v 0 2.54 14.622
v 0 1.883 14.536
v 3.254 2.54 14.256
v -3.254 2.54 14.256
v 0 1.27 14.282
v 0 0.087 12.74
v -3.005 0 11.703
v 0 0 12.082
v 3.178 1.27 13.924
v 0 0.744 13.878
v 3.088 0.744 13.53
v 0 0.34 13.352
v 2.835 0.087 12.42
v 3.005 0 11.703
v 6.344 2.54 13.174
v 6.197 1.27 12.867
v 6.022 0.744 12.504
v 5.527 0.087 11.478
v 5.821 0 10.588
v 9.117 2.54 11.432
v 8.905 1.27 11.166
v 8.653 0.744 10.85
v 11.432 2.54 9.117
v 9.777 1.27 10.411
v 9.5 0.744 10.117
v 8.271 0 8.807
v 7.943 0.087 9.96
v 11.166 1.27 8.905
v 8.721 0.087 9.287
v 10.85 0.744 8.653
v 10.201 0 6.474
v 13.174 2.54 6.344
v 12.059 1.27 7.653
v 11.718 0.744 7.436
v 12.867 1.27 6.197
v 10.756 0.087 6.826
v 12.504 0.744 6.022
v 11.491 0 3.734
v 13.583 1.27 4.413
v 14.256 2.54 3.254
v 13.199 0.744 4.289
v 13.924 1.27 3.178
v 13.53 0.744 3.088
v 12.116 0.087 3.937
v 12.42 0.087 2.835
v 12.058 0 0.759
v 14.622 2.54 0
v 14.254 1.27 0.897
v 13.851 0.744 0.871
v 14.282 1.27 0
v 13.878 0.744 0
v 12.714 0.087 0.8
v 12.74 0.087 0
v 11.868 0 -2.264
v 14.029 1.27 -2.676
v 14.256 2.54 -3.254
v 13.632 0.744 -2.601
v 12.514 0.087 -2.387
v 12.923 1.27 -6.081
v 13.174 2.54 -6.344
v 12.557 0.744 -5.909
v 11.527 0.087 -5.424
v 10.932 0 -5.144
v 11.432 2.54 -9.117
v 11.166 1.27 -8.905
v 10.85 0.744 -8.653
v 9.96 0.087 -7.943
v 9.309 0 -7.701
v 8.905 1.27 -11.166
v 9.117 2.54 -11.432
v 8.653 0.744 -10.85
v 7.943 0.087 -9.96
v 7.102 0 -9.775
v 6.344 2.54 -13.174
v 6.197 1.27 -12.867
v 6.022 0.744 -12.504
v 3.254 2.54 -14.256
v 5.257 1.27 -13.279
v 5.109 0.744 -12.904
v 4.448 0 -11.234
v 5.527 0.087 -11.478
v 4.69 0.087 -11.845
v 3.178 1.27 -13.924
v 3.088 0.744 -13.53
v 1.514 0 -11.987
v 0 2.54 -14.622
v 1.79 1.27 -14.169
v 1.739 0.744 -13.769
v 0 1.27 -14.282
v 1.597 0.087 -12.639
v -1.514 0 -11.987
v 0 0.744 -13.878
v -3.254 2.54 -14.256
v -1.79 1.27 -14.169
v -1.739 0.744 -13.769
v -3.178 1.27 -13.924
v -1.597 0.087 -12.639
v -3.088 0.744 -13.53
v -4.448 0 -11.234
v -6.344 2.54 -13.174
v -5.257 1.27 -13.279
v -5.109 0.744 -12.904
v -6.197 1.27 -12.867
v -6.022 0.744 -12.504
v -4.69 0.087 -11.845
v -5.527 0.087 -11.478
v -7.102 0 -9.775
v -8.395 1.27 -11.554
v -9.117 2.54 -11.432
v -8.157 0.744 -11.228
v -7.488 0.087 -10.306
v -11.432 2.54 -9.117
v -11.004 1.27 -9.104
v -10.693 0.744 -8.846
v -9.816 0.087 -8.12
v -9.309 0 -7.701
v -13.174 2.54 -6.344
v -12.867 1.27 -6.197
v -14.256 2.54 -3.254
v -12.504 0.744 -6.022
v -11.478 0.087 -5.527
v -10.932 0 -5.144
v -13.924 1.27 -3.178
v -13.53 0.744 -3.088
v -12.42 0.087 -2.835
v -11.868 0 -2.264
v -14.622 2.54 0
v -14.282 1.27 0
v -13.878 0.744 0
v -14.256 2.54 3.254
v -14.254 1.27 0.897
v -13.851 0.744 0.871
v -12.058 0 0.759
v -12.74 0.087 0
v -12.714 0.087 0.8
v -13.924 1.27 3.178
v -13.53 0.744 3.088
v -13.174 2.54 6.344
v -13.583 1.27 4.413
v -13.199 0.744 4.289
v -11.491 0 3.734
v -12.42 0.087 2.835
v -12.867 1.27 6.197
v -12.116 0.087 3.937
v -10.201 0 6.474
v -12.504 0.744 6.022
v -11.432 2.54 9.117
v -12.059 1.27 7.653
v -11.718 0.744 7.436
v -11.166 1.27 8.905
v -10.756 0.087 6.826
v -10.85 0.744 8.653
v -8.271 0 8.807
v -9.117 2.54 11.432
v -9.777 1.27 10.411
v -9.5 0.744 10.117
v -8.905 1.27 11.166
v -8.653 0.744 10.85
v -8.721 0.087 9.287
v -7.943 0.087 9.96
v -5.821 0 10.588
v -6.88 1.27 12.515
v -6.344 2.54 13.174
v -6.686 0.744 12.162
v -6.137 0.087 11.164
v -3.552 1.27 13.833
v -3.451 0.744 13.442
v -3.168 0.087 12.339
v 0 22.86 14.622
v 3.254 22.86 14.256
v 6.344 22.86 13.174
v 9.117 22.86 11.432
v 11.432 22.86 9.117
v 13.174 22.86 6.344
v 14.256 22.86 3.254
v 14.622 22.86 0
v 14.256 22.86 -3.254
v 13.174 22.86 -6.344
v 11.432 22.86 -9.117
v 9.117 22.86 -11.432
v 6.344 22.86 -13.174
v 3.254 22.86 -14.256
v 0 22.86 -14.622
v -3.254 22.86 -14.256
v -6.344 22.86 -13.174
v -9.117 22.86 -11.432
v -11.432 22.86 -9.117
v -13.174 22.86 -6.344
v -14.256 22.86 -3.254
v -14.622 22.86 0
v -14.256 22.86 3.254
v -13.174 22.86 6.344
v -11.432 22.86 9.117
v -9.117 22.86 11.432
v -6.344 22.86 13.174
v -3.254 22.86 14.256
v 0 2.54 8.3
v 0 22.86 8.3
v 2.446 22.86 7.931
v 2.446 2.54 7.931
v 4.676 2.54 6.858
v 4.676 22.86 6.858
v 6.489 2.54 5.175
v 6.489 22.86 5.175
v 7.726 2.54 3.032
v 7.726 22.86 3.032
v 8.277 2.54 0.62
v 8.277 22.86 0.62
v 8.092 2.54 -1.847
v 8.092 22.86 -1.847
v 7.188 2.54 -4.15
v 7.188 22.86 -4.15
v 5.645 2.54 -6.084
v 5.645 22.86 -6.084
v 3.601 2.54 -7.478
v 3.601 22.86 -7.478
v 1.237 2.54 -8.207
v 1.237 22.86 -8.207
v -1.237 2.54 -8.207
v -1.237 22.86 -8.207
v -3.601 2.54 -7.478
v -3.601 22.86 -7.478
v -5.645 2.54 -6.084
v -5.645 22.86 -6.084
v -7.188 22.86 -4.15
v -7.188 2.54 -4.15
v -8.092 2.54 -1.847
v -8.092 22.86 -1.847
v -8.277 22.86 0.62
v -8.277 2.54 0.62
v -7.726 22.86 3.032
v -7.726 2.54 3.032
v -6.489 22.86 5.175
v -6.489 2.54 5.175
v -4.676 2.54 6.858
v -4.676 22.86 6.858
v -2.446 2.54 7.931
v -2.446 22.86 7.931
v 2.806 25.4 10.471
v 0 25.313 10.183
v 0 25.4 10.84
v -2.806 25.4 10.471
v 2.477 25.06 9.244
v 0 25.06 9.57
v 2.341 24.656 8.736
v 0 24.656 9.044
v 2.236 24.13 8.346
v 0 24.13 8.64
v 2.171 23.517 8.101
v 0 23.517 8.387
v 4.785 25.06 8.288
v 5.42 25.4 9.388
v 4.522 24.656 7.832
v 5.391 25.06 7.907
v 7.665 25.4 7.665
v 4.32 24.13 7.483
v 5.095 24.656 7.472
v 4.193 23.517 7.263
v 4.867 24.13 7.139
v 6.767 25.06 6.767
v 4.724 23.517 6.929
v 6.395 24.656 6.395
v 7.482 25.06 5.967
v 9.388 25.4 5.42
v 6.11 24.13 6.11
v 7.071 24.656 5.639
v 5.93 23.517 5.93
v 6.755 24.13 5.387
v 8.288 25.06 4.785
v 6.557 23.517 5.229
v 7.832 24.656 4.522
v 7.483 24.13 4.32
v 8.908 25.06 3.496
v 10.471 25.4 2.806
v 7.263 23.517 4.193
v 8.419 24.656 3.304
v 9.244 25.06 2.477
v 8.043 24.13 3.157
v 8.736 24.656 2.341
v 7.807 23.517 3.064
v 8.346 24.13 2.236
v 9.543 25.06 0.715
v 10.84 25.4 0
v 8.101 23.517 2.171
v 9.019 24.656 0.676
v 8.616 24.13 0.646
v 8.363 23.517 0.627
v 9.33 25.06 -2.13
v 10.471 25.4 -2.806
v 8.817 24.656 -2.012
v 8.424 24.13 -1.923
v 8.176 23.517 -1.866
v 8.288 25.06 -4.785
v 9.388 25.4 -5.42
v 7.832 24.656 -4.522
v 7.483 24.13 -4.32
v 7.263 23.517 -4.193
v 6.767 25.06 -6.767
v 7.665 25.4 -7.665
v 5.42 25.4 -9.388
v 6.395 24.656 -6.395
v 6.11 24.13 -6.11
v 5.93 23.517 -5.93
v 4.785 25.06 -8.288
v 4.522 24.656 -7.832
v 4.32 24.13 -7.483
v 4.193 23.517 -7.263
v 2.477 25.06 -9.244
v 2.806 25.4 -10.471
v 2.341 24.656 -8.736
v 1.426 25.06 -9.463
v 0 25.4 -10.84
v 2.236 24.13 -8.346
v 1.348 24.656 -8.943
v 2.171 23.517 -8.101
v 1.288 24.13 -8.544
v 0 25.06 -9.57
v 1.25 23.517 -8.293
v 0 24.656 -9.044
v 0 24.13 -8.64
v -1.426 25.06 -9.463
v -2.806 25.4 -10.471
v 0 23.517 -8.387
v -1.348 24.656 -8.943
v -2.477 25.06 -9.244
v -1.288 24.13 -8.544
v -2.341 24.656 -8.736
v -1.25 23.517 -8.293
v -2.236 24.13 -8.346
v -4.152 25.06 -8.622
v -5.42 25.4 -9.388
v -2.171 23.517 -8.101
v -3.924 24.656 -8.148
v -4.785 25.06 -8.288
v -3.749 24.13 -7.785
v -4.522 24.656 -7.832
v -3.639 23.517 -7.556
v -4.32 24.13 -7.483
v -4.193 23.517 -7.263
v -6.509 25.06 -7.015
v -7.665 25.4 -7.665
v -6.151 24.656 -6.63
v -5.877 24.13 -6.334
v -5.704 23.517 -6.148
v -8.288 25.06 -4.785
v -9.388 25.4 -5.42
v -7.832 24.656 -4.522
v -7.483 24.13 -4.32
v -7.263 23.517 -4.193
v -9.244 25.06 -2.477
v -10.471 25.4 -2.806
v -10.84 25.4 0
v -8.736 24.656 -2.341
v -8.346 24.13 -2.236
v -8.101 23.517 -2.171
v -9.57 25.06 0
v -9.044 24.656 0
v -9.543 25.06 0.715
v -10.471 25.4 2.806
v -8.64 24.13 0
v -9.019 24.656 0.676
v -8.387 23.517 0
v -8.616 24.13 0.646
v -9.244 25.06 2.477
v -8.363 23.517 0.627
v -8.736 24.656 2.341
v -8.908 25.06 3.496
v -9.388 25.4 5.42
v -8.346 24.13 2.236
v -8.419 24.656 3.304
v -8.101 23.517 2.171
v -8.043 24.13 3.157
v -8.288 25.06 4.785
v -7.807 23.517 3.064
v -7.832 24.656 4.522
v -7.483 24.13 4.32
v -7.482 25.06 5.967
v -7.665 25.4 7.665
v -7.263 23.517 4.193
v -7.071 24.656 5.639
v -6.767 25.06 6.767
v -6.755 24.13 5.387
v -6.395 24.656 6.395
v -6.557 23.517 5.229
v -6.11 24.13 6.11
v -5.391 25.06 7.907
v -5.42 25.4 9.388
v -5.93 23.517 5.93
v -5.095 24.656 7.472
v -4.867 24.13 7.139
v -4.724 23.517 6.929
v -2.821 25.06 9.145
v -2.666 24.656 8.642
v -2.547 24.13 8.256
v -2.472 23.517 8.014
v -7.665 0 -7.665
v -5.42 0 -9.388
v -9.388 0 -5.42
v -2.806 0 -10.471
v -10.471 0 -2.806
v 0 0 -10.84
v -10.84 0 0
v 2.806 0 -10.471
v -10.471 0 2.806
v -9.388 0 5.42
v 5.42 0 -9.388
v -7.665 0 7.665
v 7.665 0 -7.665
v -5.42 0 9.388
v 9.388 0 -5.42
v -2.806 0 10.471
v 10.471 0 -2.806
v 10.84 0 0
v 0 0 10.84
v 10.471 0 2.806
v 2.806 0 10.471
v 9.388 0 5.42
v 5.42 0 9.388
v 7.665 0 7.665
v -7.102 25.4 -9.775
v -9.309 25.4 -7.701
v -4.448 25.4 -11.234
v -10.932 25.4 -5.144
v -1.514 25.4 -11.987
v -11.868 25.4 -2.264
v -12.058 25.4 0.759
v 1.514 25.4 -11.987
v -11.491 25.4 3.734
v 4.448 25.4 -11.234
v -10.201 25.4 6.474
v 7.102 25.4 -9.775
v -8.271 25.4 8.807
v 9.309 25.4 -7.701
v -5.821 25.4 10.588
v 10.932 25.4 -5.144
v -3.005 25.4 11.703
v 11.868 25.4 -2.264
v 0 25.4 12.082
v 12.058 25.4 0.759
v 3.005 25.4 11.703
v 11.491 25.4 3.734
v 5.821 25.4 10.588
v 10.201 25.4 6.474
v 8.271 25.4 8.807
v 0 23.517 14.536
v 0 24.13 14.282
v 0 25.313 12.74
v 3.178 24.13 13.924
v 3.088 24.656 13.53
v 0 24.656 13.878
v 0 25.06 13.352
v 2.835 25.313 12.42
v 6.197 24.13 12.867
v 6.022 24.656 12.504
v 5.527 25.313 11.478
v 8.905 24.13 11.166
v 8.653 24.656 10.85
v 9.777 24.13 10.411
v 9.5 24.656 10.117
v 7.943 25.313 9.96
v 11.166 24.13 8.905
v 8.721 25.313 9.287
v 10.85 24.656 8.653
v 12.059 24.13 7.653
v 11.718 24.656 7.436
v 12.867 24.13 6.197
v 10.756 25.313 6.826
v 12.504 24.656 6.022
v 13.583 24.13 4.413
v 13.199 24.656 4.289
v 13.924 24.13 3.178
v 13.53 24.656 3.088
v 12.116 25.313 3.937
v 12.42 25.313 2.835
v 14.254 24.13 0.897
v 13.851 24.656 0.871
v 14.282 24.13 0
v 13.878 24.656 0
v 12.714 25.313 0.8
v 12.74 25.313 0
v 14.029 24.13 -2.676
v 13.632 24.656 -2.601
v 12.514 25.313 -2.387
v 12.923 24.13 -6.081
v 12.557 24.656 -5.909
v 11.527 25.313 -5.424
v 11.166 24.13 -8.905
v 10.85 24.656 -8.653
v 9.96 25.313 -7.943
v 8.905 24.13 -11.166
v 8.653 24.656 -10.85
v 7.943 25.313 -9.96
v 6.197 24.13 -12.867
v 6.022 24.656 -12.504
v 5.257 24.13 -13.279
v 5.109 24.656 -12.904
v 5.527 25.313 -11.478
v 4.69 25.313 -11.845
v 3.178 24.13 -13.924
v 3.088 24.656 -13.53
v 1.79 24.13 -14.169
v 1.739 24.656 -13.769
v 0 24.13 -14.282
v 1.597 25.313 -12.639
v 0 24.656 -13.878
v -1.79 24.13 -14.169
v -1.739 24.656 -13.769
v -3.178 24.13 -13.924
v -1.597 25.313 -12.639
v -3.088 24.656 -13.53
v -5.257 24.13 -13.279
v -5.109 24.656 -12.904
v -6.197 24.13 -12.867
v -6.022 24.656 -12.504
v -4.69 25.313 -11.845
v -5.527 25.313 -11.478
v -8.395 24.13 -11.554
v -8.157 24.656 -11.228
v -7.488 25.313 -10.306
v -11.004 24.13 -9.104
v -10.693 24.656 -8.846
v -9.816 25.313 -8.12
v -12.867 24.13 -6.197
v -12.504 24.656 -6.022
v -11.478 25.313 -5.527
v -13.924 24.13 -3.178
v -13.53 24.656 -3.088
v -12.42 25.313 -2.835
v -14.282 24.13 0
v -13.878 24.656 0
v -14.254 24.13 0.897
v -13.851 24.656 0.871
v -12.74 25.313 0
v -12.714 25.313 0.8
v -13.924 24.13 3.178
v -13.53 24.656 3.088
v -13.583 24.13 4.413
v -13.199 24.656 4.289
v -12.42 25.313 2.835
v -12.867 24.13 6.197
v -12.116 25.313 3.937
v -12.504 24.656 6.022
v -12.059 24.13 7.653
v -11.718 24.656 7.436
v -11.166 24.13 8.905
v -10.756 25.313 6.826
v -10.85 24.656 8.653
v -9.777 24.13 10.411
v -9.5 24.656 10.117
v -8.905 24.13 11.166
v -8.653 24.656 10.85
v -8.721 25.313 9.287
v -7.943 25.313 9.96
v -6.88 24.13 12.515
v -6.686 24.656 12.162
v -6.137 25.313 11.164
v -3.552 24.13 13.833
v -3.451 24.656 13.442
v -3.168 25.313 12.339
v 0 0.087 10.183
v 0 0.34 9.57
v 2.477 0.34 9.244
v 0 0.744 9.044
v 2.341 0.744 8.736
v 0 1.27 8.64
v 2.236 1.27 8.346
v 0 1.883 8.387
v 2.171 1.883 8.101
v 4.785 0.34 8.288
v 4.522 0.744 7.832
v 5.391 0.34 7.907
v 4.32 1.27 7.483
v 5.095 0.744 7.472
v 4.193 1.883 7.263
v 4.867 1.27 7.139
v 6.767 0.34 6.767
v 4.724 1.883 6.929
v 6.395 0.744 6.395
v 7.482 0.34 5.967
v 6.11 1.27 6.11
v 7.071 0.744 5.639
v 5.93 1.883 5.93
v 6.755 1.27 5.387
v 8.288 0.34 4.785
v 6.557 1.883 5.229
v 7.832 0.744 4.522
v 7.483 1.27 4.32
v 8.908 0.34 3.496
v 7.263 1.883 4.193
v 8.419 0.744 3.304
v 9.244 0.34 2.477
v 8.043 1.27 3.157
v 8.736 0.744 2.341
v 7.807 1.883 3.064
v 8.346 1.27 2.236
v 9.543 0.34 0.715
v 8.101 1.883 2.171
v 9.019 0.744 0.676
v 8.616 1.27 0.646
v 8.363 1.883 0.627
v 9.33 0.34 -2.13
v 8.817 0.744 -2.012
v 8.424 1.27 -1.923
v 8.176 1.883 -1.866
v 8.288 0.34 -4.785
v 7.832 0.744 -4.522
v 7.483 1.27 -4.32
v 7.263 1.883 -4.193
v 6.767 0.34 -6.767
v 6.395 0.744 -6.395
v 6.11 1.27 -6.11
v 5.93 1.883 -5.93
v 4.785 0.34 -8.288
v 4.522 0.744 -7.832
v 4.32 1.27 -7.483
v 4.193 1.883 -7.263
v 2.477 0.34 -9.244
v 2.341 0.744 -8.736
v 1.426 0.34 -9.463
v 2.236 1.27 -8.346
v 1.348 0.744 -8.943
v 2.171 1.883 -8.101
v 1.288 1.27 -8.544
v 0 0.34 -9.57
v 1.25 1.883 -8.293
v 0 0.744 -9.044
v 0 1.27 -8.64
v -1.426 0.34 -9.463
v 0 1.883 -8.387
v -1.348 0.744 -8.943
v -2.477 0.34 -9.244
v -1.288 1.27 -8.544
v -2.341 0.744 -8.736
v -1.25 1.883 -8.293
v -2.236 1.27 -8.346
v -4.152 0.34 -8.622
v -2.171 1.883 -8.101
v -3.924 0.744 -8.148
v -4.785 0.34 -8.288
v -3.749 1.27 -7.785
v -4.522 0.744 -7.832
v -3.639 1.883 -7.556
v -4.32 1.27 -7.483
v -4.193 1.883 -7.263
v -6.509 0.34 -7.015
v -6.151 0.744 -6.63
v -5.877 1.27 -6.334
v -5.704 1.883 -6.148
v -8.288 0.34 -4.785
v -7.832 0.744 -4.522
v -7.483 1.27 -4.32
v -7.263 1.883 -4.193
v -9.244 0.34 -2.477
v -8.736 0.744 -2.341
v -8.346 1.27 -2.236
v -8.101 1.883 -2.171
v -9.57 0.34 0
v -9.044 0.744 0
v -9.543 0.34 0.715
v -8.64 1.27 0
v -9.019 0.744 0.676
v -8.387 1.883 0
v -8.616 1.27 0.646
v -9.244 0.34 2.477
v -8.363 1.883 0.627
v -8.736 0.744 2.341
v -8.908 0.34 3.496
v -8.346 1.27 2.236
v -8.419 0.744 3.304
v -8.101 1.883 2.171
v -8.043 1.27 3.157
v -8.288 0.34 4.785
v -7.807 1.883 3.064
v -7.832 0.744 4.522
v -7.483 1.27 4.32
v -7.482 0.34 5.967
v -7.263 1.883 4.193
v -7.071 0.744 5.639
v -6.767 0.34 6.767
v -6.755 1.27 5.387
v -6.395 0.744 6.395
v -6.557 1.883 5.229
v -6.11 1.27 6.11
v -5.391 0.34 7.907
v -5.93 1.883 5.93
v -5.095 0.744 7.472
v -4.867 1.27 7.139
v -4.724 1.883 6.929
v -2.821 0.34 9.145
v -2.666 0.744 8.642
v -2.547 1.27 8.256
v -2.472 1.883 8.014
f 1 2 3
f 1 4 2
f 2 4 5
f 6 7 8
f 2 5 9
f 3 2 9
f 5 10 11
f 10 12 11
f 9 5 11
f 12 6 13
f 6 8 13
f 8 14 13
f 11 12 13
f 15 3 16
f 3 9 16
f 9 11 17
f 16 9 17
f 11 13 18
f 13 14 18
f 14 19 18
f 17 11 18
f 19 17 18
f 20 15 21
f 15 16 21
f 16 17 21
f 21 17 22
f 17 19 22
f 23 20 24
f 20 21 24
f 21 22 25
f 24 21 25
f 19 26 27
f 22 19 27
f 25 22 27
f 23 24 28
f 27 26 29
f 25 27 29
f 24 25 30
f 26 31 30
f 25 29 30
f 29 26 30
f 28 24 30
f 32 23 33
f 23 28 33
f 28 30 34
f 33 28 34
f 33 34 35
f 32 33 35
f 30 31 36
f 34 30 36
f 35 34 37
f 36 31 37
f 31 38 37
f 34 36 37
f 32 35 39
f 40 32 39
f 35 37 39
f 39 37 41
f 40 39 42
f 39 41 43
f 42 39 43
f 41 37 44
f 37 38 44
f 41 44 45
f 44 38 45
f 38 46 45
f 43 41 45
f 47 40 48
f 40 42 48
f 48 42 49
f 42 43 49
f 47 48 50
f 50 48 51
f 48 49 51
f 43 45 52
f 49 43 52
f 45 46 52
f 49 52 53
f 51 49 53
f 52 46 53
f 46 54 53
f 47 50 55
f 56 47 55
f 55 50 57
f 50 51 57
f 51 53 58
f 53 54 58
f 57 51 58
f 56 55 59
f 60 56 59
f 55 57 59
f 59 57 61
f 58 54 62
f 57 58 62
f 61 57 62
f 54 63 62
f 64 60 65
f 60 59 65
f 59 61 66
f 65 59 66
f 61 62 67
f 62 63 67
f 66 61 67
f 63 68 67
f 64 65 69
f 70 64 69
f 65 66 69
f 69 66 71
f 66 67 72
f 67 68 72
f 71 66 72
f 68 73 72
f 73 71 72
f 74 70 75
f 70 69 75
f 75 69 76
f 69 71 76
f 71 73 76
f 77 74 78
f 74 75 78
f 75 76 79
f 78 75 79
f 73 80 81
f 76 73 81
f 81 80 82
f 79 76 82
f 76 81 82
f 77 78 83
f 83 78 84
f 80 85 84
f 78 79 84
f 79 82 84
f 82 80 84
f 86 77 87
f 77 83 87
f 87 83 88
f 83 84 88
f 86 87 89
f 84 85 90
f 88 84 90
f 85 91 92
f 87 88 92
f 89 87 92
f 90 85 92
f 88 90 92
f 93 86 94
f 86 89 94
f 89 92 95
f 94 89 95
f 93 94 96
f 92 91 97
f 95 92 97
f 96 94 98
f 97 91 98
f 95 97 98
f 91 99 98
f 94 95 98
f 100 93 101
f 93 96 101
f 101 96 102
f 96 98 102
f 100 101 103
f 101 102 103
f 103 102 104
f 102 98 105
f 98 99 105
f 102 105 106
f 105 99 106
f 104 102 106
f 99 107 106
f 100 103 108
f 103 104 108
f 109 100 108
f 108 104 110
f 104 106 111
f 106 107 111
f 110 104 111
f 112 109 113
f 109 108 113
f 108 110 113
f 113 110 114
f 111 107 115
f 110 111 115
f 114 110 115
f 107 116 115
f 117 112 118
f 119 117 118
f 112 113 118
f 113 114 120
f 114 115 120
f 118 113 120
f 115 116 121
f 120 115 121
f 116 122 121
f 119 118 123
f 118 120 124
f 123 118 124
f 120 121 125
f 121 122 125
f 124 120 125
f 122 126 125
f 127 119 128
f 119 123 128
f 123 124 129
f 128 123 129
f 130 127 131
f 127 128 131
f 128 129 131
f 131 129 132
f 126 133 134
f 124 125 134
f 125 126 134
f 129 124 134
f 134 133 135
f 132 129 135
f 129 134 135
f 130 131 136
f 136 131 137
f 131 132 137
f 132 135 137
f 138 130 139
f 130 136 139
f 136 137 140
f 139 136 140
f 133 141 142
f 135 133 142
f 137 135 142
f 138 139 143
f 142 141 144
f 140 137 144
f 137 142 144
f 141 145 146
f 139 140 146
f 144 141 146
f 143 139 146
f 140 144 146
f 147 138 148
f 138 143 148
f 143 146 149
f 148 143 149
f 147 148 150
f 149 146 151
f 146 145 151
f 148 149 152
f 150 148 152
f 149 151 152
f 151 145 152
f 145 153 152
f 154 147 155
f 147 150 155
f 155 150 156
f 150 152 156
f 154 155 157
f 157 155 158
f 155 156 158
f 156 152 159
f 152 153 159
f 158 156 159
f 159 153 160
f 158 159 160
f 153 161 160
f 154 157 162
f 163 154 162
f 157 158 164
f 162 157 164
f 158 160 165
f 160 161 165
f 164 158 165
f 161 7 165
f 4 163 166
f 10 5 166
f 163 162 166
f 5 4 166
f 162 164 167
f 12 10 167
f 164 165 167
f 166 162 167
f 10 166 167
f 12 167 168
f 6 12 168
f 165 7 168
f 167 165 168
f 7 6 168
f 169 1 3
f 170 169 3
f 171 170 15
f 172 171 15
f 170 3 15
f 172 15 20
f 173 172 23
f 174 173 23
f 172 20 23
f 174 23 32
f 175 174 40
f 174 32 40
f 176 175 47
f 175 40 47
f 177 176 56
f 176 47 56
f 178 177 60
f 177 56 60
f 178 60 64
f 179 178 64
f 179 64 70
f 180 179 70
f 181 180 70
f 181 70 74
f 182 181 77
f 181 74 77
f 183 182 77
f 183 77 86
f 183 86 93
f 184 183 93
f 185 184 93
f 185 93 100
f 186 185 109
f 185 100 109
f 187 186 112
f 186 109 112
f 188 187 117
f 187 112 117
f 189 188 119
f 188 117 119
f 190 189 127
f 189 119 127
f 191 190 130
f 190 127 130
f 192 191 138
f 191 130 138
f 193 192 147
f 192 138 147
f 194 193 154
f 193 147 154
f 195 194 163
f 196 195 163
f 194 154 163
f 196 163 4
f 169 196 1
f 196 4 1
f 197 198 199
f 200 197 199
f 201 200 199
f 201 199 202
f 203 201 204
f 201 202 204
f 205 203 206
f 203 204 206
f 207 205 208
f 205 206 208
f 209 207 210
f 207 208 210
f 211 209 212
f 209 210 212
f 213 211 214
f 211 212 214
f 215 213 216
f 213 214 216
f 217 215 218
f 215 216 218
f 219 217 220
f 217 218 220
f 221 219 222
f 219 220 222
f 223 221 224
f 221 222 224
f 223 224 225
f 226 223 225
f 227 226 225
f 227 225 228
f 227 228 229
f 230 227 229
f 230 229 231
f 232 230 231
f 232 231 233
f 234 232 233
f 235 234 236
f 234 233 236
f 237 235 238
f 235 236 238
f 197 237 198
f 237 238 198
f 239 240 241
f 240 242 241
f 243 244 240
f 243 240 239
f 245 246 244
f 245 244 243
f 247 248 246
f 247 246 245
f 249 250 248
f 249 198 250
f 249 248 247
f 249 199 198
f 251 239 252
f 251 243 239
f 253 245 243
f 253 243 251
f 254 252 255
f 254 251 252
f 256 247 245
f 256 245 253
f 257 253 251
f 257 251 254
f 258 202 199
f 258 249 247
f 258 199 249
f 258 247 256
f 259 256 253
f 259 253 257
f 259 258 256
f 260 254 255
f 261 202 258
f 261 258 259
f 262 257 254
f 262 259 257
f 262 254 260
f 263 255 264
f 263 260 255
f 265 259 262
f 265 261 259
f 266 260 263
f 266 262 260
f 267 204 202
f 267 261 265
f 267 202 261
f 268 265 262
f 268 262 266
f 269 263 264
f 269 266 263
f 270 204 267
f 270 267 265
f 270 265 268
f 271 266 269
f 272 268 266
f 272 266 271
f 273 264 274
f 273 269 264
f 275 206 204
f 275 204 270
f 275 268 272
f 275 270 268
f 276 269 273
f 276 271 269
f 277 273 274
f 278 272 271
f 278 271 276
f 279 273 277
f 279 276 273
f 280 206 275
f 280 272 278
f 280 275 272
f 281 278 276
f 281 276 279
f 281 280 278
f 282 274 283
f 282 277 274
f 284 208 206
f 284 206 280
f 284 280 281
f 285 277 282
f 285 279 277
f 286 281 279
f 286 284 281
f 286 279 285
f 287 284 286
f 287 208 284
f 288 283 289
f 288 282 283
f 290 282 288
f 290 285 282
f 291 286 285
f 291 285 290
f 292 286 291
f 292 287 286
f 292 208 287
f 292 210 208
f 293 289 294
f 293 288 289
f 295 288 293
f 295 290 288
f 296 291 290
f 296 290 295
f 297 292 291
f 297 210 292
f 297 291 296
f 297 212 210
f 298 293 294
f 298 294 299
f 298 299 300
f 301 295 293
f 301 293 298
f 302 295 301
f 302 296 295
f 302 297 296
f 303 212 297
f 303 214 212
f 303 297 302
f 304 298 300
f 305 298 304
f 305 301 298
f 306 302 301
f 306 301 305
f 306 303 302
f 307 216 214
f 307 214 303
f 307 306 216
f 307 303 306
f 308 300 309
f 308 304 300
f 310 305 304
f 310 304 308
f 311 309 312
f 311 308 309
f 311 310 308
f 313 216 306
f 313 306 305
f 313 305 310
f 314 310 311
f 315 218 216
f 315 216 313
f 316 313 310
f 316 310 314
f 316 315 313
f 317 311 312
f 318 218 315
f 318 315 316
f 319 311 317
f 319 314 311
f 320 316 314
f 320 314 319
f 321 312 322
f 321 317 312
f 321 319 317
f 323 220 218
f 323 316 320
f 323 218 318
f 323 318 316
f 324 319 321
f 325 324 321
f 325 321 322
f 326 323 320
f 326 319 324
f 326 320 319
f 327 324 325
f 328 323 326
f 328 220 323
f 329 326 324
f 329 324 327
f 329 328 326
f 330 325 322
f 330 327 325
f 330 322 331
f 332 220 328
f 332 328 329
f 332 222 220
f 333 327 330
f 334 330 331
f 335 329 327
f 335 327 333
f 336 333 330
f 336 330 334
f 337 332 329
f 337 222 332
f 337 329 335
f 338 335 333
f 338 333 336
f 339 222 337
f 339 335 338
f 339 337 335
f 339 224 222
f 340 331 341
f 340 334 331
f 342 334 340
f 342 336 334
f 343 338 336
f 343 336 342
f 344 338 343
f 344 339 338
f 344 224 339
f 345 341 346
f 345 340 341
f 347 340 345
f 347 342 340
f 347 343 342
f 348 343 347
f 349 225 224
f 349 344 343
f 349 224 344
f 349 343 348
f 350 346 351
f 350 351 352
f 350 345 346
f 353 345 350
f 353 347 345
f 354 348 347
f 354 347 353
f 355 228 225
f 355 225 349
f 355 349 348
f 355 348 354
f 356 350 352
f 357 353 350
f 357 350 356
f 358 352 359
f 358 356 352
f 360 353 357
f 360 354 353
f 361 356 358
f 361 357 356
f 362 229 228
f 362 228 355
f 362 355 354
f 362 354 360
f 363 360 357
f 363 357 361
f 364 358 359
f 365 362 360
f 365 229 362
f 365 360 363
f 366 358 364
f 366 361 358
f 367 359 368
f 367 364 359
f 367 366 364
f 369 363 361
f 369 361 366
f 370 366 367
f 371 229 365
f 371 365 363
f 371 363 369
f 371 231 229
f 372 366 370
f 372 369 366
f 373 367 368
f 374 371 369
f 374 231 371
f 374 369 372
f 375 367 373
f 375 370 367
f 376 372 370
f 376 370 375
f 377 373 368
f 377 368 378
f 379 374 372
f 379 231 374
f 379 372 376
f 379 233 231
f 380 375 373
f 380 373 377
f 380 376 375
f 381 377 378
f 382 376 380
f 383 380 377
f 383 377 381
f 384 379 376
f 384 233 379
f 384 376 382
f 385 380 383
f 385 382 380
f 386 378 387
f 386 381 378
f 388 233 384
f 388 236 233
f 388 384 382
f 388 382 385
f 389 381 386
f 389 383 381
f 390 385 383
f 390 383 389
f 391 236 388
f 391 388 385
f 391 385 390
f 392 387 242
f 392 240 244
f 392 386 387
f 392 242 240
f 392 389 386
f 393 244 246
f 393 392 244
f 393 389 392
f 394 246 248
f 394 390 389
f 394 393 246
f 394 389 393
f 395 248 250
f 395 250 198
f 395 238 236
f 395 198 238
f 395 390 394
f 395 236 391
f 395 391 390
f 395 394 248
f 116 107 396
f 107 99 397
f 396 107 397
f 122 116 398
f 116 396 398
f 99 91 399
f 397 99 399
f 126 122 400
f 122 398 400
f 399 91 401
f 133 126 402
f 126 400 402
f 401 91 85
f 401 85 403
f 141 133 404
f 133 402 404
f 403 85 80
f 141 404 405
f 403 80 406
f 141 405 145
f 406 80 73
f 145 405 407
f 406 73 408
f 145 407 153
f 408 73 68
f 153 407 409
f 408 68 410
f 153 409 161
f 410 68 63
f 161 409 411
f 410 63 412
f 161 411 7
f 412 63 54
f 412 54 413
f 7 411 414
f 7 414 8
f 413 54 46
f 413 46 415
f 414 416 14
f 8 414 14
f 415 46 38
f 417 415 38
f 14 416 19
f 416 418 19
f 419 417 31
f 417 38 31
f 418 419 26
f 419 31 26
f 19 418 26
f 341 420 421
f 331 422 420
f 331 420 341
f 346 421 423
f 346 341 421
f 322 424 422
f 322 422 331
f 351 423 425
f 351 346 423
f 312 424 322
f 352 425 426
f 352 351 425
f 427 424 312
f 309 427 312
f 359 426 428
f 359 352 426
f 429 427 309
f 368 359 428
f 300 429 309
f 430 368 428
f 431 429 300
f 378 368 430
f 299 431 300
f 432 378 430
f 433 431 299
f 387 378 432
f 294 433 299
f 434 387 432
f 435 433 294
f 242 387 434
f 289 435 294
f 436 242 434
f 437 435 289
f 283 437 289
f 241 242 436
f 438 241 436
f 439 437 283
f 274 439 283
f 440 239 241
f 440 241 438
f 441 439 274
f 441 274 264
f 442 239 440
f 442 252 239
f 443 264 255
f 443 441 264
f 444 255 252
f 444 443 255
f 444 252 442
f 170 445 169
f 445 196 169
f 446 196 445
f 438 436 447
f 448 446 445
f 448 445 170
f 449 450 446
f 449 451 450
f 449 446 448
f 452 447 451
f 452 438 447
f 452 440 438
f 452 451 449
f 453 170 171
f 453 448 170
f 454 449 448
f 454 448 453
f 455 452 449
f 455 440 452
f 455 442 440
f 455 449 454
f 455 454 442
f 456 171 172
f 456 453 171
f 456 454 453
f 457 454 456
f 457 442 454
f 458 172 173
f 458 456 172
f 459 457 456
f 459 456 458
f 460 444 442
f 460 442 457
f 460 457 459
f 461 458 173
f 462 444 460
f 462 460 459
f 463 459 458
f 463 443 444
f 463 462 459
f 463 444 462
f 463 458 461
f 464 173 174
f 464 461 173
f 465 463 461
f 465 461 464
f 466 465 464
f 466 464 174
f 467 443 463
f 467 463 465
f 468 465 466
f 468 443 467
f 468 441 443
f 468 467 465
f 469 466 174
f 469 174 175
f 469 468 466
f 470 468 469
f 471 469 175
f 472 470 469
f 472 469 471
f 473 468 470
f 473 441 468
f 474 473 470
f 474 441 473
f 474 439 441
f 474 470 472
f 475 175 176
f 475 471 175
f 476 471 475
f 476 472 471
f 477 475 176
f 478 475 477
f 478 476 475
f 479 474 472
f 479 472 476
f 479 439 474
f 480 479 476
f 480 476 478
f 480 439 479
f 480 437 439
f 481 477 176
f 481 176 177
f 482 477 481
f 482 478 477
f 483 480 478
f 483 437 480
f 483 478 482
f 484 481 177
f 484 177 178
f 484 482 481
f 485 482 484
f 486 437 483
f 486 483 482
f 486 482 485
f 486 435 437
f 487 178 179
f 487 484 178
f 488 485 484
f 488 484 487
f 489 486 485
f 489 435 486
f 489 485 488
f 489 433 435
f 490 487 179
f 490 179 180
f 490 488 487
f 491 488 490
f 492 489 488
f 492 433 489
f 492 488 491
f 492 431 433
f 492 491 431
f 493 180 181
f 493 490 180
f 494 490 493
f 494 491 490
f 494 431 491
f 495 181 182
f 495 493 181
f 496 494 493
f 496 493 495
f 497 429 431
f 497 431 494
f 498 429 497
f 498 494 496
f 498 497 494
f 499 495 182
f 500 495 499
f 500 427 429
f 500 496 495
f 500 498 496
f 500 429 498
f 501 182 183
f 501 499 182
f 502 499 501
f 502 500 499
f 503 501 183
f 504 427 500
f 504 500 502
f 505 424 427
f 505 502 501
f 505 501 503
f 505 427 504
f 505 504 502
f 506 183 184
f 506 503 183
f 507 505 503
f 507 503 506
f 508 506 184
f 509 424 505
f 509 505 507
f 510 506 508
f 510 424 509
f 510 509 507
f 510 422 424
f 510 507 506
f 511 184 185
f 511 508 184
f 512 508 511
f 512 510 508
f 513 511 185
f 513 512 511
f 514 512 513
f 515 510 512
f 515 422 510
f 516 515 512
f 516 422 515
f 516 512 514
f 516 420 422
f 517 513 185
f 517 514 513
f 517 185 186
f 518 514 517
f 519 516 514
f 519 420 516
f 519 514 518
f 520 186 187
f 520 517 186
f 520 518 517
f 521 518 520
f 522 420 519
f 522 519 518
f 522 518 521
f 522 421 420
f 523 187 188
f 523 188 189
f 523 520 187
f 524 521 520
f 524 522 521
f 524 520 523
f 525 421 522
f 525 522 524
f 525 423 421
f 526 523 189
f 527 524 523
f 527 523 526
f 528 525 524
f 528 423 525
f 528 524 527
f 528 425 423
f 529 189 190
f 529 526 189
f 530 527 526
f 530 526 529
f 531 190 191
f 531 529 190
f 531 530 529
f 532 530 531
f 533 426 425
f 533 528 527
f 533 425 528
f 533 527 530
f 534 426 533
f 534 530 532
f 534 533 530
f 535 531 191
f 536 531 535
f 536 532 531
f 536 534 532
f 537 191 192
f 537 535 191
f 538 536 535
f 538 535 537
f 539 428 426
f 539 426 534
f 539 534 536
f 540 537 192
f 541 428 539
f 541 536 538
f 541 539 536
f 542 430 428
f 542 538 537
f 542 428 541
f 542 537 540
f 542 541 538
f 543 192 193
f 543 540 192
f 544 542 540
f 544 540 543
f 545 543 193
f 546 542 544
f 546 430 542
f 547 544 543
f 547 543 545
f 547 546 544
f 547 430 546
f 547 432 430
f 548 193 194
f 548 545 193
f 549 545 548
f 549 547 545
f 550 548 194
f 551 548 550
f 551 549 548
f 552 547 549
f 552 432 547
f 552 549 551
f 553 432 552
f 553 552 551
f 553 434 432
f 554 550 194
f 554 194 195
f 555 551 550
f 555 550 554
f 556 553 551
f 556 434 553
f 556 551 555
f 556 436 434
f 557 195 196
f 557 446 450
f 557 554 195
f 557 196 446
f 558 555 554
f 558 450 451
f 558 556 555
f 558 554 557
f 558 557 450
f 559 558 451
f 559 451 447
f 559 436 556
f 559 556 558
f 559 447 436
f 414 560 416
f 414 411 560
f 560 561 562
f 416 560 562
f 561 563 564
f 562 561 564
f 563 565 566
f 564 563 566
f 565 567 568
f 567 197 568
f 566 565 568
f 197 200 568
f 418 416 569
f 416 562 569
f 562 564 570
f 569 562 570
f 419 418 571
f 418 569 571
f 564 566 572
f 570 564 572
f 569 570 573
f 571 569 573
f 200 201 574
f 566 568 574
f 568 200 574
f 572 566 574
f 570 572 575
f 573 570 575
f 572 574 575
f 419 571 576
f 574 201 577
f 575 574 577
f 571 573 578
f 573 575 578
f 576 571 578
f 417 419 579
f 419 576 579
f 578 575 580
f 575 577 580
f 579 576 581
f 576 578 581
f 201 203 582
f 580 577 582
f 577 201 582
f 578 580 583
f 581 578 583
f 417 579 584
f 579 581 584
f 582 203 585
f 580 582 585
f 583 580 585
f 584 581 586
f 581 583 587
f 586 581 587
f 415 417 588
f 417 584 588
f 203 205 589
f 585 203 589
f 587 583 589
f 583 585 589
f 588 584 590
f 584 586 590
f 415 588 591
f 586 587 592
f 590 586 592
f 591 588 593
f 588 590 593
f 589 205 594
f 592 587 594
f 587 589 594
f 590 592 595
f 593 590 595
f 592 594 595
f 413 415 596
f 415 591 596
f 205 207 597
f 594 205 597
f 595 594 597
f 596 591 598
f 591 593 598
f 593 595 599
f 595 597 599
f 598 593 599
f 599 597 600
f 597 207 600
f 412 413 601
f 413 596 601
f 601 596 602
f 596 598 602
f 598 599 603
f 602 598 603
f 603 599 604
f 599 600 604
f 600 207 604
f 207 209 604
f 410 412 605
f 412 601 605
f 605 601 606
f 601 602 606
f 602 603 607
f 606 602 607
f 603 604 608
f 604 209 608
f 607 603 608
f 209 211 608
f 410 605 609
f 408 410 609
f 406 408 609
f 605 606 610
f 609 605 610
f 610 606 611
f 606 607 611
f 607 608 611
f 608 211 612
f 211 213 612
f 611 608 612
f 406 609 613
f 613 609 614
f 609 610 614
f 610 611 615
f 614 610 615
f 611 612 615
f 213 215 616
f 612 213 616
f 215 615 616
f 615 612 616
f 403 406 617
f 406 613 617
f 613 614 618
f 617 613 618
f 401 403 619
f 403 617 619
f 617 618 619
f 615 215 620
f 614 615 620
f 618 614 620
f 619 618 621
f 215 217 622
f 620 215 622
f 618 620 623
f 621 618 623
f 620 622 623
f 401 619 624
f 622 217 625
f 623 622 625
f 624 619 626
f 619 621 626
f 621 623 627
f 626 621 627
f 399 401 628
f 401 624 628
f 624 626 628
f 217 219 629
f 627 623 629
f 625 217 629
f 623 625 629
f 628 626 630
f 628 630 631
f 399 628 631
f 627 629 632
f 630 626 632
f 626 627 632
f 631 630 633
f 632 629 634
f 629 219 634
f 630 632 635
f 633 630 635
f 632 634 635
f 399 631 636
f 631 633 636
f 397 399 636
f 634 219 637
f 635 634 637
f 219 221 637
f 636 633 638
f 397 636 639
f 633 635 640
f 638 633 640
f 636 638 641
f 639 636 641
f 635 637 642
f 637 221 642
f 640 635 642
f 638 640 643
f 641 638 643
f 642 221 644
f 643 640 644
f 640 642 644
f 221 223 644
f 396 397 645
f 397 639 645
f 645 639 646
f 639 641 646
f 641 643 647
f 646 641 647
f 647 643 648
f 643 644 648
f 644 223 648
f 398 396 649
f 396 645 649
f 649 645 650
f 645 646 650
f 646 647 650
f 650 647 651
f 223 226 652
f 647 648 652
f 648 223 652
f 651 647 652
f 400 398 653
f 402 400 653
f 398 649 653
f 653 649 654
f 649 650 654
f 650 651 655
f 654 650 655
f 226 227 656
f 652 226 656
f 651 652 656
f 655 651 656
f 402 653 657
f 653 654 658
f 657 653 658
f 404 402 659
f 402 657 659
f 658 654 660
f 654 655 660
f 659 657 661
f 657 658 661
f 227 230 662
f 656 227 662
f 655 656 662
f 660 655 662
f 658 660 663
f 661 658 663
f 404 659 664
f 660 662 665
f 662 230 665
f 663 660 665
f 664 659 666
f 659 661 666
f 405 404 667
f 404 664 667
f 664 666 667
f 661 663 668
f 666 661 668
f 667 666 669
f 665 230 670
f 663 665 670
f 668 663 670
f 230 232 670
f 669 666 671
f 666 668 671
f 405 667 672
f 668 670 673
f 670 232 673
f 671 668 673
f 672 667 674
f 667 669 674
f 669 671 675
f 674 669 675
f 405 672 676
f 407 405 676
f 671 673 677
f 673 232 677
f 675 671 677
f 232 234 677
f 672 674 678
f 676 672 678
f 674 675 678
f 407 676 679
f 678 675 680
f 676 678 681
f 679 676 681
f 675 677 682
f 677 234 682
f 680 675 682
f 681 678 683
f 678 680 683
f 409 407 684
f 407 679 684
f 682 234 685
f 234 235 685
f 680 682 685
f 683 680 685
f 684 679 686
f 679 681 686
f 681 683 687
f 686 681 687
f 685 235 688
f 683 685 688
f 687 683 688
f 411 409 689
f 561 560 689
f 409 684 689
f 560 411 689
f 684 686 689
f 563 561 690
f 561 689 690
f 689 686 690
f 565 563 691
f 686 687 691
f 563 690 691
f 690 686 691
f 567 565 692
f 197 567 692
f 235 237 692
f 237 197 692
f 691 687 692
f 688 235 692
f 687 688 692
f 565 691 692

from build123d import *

# Parameters (mm, degrees)
SKETCH1_R           = 14.622116372
BOSS_EXTRUDE2_DEPTH = 25.4
SKETCH2_R           = 8.3
CUT_EXTRUDE1_DEPTH  = 25.4
FILLET1_R           = 2.54


with BuildPart() as part:
    # Sketch1 → Boss-Extrude2 (new body)
    with BuildSketch(Plane(origin=(0, 0, 0), x_dir=(1, 0, 0), z_dir=(0, 1, 0))):
        with Locations(Location((0, 0, 0), (0, 0, 270))):
            Circle(SKETCH1_R)
    extrude(amount=BOSS_EXTRUDE2_DEPTH)

    # Sketch2 → Cut-Extrude1 (cut)
    with BuildSketch(Plane(origin=(0, 25.4, 0), x_dir=(1, 0, 0), z_dir=(0, 1, 0))):
        with Locations(Location((0, 0, 0), (0, 0, 270))):
            Circle(SKETCH2_R)
    extrude(amount=-CUT_EXTRUDE1_DEPTH, mode=Mode.SUBTRACT)

    # Fillet1
    fillet1_edges = [part.edges().sort_by_distance(p)[0] for p in [
        (0, 0, -14.622116372),
        (0, 25.4, -14.622116372),
        (0, 0, -8.3),
        (0, 25.4, -8.3),
    ]]
    fillet(fillet1_edges, radius=FILLET1_R)


solid = part.part
